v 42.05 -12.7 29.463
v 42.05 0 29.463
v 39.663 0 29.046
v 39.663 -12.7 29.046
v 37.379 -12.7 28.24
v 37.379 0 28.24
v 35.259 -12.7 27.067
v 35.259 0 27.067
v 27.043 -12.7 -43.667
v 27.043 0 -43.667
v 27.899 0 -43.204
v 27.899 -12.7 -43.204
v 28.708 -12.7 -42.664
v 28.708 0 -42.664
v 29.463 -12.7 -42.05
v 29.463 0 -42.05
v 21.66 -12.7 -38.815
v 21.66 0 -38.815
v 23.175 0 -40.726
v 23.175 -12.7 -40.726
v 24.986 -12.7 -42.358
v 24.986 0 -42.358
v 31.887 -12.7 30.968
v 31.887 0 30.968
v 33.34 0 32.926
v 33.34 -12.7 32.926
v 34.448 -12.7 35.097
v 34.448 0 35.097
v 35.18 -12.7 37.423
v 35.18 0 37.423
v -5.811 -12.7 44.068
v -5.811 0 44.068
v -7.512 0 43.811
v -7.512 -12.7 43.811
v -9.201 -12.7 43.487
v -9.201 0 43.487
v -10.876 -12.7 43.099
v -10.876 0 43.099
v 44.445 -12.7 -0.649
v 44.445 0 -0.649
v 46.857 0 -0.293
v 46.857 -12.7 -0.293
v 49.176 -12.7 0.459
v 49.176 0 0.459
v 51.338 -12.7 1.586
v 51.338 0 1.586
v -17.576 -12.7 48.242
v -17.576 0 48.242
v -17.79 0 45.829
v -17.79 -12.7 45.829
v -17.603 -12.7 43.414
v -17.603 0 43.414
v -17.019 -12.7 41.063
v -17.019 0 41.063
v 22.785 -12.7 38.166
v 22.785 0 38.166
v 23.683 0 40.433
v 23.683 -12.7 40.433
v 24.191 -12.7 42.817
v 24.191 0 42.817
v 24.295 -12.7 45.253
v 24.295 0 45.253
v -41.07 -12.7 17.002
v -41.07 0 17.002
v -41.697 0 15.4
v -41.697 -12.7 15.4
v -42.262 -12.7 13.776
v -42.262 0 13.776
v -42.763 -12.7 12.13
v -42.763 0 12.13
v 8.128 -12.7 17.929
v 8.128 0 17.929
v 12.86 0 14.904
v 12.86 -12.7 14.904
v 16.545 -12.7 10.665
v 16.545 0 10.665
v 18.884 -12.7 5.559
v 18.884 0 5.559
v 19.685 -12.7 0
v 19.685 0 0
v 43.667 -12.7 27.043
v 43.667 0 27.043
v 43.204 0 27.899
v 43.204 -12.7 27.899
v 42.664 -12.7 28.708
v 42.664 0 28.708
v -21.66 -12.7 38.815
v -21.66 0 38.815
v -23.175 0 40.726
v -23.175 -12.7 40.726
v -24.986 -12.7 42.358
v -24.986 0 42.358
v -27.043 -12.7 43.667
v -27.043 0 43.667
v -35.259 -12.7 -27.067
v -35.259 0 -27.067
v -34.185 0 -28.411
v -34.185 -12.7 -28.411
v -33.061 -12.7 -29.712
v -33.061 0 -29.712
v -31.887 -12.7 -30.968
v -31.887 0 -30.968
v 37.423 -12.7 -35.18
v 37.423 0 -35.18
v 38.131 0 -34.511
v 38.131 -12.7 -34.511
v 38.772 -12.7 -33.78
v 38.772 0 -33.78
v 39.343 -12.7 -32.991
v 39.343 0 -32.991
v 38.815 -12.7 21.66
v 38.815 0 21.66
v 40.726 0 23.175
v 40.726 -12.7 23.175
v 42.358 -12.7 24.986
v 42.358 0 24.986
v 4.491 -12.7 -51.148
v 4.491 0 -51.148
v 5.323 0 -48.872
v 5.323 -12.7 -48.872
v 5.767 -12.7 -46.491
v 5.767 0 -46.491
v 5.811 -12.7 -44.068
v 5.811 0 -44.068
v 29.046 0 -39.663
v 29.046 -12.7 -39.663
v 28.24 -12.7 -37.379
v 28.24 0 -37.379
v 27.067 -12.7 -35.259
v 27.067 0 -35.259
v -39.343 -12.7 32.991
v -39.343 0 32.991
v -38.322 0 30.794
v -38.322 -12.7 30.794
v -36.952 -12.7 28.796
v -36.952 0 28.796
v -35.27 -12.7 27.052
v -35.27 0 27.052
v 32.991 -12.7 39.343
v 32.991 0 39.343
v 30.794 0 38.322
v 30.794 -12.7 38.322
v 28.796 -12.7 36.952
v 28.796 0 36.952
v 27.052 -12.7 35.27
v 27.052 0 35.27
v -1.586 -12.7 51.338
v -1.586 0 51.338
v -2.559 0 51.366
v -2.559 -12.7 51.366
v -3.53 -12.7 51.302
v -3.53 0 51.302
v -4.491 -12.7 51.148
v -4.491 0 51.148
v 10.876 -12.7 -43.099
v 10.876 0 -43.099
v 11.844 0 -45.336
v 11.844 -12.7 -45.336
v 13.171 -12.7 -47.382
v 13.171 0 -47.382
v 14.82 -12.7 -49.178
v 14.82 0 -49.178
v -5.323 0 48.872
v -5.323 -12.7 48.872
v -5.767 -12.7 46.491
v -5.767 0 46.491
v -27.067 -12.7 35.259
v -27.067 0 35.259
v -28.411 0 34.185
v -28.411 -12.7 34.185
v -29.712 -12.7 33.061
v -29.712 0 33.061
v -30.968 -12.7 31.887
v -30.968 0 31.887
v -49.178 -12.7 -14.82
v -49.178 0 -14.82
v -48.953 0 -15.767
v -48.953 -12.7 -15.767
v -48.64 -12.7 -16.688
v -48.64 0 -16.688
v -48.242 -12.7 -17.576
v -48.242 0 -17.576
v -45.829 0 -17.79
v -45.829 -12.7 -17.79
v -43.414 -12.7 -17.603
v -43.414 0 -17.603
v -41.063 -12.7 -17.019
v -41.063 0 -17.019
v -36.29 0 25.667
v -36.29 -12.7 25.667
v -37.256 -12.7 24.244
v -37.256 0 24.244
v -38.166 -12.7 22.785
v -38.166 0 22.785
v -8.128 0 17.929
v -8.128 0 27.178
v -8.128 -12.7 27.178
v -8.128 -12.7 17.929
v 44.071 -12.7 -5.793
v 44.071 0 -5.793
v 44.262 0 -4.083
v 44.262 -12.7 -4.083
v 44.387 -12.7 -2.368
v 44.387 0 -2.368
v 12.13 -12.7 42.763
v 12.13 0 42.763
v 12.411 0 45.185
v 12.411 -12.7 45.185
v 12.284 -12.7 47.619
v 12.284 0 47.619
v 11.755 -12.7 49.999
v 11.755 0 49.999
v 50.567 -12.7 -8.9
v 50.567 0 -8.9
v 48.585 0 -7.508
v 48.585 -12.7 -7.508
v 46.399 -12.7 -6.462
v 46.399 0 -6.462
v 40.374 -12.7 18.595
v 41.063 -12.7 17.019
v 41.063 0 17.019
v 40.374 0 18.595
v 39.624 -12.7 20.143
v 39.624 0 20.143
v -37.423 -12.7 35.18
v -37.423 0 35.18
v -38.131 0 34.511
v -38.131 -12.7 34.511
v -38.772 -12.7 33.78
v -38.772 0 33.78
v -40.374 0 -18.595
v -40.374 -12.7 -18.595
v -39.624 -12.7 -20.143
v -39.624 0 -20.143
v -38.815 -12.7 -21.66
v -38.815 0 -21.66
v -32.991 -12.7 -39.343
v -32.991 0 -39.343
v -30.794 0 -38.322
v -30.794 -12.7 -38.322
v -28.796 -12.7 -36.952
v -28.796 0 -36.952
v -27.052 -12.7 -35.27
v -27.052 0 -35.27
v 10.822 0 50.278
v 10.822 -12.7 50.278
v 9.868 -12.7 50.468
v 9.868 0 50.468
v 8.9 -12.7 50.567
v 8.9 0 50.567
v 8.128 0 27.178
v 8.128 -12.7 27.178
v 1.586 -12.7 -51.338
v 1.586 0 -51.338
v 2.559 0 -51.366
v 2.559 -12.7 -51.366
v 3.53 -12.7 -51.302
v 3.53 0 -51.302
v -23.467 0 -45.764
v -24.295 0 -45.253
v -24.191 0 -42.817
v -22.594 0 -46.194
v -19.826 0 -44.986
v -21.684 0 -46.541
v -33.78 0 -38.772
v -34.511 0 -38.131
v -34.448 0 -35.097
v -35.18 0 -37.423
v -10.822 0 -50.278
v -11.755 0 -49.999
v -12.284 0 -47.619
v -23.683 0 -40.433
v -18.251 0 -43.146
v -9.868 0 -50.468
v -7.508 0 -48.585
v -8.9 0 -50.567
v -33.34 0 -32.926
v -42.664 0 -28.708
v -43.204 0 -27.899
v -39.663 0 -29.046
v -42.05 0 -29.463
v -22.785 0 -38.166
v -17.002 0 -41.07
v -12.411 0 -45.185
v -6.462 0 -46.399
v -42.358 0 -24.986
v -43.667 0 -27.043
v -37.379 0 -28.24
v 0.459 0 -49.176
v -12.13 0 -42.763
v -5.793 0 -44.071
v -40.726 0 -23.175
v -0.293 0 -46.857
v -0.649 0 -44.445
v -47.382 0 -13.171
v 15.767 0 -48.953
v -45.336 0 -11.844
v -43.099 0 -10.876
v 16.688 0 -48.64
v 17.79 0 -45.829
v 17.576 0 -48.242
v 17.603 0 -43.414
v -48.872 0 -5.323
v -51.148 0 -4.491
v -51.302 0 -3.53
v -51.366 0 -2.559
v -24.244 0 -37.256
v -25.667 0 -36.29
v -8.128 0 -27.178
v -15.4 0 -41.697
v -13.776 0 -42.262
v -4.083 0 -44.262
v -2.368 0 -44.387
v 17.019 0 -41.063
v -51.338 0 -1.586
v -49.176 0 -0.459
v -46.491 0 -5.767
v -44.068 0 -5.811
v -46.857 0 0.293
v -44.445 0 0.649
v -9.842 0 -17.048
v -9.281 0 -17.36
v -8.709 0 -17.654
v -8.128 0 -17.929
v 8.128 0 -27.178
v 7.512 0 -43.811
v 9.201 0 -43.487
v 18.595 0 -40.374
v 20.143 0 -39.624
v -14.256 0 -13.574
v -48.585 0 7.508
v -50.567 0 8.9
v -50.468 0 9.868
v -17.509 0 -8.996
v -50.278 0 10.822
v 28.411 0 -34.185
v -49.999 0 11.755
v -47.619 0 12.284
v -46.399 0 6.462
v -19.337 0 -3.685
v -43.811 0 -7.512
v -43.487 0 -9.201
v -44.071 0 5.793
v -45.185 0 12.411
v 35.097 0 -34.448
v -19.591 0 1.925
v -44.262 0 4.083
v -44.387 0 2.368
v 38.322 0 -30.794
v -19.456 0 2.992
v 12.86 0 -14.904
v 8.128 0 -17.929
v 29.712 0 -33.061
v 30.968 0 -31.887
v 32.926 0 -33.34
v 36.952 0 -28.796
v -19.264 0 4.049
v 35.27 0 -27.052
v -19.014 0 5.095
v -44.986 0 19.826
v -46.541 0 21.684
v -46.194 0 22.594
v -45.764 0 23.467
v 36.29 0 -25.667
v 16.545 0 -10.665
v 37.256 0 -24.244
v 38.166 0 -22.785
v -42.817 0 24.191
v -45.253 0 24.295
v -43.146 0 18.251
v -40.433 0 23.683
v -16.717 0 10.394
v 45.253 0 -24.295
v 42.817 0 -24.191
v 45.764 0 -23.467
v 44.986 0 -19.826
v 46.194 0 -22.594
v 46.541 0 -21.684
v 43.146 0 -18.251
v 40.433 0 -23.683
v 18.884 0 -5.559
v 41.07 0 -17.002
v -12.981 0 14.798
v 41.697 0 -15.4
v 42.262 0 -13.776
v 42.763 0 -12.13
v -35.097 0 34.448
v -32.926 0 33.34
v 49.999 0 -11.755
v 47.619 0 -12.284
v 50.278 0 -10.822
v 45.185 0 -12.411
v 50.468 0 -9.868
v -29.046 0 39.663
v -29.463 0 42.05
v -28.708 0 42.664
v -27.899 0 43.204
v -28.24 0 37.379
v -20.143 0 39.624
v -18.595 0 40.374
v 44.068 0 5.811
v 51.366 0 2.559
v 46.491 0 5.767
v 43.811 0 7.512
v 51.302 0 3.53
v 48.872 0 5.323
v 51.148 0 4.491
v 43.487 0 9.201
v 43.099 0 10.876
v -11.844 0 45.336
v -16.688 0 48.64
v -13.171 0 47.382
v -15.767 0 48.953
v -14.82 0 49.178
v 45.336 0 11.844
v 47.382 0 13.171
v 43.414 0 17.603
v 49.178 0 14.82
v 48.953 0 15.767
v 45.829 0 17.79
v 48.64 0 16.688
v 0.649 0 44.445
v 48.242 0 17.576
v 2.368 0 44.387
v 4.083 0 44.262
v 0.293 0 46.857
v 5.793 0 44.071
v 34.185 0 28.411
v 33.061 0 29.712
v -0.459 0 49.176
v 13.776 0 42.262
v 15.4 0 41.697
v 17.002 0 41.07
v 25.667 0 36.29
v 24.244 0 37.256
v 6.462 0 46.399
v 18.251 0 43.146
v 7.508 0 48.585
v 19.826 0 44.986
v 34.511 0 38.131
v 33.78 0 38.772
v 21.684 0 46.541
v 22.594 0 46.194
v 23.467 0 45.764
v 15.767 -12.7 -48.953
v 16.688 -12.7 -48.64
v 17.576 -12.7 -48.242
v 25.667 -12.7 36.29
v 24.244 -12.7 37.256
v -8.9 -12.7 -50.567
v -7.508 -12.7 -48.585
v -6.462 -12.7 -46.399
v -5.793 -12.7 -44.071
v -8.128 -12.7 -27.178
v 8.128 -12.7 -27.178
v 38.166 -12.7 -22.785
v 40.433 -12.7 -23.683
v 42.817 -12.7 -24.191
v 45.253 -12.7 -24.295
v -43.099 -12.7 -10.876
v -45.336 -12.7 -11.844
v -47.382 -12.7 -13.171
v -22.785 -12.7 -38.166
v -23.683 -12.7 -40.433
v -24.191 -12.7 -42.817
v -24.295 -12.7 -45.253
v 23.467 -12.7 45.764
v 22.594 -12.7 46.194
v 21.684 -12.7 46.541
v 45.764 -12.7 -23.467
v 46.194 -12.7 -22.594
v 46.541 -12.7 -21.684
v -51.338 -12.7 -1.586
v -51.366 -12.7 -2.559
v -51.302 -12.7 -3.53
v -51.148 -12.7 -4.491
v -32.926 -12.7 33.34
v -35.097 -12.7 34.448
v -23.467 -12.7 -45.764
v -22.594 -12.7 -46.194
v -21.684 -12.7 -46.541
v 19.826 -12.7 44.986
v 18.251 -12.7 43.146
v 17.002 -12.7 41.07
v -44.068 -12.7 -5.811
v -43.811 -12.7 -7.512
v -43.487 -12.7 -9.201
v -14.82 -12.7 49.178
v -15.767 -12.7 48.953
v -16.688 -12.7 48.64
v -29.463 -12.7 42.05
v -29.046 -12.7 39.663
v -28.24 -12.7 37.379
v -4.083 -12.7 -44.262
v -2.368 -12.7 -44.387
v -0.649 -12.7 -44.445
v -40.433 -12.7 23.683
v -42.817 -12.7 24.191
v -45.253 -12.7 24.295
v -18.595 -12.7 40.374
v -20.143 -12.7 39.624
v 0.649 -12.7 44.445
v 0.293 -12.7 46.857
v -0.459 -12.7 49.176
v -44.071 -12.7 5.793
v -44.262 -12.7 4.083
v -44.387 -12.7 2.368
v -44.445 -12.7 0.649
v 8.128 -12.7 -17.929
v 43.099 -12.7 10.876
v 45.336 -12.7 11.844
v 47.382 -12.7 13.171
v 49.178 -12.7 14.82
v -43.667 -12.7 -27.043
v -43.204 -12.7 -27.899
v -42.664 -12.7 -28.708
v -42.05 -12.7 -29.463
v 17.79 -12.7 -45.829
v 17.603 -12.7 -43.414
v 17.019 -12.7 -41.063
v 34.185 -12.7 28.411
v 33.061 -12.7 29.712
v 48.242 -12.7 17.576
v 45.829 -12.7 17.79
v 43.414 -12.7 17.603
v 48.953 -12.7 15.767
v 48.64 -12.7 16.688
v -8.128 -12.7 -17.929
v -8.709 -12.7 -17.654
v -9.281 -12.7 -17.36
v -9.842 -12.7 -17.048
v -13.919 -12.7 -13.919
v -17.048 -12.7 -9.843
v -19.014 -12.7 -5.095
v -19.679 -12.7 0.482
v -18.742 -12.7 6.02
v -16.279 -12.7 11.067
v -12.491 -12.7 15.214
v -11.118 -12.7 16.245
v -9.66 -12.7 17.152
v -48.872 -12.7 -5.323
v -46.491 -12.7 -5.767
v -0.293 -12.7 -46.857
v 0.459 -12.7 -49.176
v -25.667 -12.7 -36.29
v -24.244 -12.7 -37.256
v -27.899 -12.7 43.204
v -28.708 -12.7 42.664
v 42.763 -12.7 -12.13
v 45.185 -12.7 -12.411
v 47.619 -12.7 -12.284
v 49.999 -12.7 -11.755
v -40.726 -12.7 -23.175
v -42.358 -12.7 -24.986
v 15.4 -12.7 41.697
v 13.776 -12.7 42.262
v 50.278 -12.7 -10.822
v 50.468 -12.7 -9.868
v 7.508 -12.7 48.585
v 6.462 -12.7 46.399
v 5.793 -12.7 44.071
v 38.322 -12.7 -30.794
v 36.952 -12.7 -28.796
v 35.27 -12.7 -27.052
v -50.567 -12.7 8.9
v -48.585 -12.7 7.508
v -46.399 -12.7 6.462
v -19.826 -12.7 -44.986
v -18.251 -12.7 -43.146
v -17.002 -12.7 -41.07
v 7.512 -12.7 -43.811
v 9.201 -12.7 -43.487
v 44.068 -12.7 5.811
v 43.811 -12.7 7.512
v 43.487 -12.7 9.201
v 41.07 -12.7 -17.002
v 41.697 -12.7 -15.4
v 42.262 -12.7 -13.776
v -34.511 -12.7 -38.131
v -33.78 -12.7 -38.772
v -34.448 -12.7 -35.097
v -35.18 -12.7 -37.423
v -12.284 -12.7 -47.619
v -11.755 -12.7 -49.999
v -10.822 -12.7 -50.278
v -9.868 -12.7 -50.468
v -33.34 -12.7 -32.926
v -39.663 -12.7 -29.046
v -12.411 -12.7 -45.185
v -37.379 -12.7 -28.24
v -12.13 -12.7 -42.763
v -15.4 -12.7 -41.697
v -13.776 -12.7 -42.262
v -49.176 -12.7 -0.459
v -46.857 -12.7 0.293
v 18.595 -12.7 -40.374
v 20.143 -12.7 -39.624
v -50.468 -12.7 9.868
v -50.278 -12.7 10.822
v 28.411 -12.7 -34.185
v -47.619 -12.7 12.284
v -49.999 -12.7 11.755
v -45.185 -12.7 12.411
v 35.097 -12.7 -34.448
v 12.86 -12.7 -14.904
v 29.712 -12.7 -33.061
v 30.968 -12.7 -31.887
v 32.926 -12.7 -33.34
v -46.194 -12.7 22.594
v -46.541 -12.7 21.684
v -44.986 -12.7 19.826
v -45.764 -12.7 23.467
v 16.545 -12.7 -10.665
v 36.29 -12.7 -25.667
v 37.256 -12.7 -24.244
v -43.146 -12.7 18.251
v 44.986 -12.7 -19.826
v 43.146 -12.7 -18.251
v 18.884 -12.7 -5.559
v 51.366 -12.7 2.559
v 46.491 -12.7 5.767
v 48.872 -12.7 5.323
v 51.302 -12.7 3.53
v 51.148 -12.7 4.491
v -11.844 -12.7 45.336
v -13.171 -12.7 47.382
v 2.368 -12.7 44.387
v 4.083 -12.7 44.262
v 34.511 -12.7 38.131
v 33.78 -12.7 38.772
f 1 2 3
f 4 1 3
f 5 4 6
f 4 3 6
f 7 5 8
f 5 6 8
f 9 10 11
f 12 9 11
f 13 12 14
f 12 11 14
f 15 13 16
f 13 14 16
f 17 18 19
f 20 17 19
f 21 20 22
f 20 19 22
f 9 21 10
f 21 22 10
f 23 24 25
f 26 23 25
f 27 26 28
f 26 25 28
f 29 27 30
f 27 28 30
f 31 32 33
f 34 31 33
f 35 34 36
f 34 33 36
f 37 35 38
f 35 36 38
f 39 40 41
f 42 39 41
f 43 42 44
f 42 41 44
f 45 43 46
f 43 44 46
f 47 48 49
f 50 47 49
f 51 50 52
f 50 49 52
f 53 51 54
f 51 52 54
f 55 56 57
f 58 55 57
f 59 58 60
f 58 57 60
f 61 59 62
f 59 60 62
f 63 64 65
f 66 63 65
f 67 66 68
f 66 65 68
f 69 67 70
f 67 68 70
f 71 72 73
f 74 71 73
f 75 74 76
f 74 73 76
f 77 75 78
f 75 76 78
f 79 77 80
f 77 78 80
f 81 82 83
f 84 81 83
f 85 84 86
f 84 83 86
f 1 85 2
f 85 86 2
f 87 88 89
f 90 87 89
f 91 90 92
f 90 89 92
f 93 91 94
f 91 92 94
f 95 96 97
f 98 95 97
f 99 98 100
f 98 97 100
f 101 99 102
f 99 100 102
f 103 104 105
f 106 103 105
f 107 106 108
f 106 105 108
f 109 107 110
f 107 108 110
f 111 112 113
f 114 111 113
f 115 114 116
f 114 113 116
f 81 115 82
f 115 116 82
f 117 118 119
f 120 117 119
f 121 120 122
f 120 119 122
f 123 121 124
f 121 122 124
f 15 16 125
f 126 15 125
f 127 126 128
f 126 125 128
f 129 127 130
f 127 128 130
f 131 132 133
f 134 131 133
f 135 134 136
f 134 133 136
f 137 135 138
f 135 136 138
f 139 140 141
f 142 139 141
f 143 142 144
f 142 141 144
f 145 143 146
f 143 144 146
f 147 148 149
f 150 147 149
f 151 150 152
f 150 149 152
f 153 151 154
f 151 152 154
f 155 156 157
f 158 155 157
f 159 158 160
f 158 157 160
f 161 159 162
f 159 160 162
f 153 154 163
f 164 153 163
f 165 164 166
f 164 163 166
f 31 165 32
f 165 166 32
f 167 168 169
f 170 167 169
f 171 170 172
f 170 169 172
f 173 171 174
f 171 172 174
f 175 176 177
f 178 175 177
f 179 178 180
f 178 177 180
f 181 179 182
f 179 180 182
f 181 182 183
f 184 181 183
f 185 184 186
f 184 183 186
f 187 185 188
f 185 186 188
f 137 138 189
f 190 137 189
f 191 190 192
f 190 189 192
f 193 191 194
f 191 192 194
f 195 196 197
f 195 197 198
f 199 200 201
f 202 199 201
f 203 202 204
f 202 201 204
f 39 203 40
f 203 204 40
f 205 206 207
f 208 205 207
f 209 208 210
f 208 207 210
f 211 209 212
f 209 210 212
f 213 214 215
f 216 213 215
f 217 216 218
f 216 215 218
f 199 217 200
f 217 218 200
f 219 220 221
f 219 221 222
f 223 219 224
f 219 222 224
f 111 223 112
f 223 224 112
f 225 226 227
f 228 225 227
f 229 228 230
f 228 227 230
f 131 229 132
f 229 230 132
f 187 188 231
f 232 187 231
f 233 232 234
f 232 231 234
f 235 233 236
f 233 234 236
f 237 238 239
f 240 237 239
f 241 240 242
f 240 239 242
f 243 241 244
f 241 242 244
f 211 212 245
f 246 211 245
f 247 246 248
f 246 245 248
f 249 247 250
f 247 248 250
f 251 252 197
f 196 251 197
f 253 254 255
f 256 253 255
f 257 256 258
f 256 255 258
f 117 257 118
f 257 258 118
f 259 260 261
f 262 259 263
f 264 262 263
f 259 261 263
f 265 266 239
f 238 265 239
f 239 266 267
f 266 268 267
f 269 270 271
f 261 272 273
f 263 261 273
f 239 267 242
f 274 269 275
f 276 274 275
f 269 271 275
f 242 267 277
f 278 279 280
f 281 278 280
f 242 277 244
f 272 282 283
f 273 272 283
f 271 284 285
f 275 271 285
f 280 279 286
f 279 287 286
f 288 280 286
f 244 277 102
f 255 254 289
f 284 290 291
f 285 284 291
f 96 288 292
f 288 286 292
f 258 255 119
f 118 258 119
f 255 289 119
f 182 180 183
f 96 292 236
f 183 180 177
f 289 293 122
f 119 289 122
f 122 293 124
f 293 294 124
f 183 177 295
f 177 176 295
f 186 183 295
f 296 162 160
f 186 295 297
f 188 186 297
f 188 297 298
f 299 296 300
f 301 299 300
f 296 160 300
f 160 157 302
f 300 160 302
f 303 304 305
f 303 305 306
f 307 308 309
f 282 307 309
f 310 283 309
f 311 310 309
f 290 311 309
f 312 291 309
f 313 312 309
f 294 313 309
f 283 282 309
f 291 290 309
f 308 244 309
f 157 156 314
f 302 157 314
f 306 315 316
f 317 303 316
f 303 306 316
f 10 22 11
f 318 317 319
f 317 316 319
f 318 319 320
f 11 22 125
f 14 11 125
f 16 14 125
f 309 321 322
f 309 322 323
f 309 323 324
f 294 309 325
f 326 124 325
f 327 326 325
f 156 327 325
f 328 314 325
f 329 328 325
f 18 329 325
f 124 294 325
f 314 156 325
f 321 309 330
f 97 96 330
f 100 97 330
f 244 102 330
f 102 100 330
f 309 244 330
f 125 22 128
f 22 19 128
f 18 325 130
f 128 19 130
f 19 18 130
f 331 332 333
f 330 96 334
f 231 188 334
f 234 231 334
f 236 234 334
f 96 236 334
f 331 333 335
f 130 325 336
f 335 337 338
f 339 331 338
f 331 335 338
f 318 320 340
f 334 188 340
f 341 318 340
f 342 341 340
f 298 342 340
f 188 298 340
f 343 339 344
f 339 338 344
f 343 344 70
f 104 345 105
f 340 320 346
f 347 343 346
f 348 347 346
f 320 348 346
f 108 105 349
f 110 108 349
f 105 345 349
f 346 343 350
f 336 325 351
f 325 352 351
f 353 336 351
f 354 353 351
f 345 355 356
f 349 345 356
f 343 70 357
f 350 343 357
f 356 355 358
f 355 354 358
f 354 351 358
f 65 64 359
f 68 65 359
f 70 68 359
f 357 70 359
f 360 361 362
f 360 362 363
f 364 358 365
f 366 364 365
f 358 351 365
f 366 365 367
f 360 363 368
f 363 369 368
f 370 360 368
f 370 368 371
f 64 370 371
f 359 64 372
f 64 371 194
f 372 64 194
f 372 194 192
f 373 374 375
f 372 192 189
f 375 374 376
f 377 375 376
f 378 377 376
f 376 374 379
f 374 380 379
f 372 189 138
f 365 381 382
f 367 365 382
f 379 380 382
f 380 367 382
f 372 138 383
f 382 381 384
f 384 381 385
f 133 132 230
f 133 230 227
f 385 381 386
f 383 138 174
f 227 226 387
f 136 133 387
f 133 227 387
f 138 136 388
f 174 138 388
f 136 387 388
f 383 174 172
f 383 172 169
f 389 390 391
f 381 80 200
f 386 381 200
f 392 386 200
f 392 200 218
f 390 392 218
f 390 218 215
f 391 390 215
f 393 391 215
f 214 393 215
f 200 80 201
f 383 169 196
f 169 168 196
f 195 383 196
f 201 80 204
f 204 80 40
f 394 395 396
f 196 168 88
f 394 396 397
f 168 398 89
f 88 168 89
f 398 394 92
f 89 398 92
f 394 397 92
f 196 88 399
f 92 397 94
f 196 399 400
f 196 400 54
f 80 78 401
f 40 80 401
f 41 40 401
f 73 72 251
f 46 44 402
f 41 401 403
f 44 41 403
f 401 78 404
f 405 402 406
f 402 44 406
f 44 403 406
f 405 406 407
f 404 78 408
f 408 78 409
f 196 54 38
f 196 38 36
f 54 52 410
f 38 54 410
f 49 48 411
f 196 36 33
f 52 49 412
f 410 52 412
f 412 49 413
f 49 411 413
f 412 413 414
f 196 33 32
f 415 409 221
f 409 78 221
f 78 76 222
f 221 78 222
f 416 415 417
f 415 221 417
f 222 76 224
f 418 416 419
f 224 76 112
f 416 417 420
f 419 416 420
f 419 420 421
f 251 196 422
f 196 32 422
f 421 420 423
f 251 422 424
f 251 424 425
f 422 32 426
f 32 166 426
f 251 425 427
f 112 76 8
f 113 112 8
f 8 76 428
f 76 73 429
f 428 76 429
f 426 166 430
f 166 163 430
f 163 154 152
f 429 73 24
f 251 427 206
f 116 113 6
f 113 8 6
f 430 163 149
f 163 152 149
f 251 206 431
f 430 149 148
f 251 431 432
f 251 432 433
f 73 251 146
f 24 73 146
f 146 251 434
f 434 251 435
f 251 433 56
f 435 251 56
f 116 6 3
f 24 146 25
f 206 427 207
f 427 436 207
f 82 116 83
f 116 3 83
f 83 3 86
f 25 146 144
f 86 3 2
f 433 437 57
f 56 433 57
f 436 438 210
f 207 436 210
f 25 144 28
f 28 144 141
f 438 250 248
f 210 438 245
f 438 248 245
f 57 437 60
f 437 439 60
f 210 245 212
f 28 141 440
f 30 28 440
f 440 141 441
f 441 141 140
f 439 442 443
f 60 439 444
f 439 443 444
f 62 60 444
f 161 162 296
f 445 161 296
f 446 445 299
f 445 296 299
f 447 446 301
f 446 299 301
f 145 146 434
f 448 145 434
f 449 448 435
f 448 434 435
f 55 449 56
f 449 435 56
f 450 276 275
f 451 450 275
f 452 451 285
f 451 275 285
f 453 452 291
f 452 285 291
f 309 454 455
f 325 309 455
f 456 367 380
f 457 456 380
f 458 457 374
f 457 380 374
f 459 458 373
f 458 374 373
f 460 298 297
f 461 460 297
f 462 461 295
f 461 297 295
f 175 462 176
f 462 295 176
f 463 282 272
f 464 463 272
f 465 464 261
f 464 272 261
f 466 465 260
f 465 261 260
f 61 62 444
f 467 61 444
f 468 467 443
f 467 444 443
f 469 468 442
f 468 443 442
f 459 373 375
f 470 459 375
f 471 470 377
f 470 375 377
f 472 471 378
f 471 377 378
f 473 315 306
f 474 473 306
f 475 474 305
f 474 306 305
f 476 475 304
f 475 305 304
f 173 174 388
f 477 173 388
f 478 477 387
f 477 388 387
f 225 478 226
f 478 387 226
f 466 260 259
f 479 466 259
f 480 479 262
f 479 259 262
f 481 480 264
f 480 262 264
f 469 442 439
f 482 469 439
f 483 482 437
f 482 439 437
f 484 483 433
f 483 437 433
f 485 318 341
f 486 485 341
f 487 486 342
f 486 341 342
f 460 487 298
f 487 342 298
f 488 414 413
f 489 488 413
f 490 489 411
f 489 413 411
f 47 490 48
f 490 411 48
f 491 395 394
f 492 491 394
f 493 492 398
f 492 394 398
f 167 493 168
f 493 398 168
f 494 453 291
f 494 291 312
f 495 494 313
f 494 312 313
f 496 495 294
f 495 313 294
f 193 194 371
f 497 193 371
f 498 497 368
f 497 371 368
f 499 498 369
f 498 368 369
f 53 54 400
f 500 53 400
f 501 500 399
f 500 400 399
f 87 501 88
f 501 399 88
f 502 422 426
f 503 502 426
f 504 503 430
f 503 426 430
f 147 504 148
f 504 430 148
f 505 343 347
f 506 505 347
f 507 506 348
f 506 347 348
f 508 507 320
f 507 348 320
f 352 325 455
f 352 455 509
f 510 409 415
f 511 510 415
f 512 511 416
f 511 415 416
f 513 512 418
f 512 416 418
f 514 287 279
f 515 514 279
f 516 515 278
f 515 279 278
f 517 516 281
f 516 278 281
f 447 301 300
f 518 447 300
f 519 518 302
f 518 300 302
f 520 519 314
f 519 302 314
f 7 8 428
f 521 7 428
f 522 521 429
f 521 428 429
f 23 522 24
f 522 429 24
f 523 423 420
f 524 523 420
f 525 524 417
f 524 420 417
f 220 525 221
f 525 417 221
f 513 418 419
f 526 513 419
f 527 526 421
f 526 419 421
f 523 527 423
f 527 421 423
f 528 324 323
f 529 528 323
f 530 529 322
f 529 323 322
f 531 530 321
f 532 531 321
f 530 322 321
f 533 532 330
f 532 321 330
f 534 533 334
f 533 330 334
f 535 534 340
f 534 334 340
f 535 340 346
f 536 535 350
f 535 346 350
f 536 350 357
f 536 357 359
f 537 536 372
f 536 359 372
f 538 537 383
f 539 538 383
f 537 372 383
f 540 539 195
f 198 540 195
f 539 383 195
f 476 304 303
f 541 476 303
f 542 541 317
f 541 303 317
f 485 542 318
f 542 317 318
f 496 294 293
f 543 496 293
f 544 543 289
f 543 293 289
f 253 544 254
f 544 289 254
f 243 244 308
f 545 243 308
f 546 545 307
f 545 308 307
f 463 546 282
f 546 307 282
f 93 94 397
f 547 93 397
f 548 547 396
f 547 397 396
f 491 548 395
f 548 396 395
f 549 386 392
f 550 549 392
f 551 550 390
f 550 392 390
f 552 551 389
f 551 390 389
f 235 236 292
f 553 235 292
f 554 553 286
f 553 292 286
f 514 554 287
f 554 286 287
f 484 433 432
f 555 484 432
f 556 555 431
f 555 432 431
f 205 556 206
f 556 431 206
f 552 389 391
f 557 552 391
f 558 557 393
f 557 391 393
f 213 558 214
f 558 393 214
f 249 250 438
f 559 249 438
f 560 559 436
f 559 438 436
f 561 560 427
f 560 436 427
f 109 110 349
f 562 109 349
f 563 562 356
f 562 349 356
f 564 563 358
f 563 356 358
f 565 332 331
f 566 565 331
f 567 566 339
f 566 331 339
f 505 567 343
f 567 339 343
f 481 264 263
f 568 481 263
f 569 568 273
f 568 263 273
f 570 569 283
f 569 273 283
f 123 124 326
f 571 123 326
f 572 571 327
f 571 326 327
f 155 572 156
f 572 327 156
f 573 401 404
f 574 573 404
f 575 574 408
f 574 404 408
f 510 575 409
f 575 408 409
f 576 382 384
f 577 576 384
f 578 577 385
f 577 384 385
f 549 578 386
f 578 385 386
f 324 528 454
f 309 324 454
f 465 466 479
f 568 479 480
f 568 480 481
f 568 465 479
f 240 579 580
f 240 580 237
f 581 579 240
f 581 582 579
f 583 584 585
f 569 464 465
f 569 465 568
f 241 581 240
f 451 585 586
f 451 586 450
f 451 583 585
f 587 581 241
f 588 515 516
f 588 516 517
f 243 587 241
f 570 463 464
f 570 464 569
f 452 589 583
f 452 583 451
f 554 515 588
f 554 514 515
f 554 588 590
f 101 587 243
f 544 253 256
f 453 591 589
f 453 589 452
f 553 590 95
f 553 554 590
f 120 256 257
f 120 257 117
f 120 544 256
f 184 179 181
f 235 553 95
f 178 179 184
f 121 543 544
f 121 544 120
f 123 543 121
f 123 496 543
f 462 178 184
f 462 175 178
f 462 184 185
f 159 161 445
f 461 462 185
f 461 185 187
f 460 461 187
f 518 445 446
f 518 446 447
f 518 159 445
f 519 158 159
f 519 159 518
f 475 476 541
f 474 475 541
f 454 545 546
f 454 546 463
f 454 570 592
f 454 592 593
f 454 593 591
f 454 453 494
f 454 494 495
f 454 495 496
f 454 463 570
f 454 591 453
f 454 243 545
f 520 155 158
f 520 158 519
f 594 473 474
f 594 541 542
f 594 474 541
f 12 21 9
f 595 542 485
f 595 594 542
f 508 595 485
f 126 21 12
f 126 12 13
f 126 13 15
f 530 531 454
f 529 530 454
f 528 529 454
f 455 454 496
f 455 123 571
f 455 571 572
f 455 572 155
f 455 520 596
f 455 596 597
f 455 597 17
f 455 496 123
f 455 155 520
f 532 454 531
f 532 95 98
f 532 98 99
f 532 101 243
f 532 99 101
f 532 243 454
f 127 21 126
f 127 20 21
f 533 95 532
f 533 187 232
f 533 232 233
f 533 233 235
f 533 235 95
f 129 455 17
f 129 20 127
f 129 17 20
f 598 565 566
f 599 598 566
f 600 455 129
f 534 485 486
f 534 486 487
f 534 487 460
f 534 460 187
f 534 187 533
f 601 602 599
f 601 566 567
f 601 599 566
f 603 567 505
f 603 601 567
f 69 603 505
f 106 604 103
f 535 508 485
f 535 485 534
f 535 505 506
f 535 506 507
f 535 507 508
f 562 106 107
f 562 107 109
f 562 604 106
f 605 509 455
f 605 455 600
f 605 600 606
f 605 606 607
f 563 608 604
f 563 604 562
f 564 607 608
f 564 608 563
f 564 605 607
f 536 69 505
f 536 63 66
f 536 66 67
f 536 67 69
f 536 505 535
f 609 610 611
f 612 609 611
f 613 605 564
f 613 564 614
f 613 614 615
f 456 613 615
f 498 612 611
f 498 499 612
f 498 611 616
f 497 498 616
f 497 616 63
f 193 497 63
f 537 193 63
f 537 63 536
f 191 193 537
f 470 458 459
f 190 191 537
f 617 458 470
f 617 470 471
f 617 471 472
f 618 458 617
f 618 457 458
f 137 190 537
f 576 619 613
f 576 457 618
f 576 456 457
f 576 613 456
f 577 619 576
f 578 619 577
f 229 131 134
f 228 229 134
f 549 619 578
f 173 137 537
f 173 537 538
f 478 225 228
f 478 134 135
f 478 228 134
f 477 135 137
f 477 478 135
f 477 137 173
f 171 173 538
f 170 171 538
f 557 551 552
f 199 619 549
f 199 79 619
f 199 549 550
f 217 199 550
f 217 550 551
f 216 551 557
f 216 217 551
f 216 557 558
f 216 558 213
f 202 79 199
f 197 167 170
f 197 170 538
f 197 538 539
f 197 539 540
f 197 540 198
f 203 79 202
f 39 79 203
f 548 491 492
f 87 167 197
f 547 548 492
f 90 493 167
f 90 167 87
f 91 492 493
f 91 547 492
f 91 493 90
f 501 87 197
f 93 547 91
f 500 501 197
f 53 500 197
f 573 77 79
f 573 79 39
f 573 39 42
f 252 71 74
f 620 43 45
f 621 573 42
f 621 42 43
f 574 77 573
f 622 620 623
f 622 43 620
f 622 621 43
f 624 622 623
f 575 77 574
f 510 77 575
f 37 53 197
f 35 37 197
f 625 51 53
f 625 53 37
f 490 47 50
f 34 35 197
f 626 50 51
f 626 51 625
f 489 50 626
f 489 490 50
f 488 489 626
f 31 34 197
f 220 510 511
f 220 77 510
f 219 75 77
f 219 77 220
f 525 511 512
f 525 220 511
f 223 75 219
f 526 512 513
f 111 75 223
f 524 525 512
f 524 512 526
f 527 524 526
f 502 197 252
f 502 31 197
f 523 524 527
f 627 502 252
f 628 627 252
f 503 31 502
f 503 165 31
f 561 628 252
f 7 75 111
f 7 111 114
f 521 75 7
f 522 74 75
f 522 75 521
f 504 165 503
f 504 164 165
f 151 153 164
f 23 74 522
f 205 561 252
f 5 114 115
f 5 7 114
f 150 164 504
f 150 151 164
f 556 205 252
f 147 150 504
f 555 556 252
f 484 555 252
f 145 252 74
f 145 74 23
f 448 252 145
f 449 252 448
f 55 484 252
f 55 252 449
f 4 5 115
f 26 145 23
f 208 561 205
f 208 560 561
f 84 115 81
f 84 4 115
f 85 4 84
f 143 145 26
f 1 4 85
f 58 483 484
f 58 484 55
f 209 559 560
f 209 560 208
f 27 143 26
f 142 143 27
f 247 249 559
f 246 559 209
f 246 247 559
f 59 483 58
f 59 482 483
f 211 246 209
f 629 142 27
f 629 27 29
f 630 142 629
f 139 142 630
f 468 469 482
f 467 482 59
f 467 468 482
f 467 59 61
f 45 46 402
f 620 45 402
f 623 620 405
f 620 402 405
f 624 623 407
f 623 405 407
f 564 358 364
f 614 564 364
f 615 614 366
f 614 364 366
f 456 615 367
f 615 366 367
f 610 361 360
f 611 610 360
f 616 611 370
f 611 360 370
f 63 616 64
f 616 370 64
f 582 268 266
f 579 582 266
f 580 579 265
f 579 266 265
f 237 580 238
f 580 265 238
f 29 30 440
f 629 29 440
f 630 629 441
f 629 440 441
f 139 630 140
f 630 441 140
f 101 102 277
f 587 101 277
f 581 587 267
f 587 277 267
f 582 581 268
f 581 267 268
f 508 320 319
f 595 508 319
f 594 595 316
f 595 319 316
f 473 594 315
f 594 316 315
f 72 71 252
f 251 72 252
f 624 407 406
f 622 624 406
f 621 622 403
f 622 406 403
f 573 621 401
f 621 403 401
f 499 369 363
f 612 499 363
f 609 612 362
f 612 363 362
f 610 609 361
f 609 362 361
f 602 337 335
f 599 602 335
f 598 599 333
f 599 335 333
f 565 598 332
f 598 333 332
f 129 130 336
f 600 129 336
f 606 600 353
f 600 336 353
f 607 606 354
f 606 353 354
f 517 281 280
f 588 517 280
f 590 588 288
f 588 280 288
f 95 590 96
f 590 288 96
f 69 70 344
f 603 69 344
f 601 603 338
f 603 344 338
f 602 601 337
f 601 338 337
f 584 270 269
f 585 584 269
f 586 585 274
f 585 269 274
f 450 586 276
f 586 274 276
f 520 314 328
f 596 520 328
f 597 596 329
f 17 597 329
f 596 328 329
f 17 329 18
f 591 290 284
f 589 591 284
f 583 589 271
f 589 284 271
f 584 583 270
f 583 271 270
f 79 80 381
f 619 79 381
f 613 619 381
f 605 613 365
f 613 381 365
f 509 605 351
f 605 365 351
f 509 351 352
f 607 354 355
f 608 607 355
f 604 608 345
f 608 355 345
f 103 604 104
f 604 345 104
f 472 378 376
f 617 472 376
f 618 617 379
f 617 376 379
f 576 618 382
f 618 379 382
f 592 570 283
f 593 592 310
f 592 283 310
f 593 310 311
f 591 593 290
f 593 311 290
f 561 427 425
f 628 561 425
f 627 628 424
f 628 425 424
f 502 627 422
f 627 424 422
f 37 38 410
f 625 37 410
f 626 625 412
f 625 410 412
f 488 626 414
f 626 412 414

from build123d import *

# Parameters (mm, degrees)
F1_DEPTH = 12.7
F2_COUNT = 24
F2_ANGLE = 345
F3_DEPTH = 25.4


# Not quite as in the source:
# - a feature names something its author has since deleted; it is built from what else it names


with BuildPart() as f1:
    # F0 (on Front) → F1 (new body)
    with BuildSketch(Plane.XZ):
        with BuildLine():
            ThreePointArc((-5.81118052, 44.0684998719), (-29.3043983549, -33.4223688128), (44.45, 0))
            ThreePointArc((44.45, 0), (31.6596085179, 31.2005078243), (0.6492491116, 44.4452581902))
            ThreePointArc((0.6492491116, 44.4452581902), (-2.5878312685, 44.3746056808), (-5.81118052, 44.0684998719))
        make_face()
        with BuildLine():
            ThreePointArc((8.128, 17.9286039892), (16.5453755624, 10.6653538385), (19.685, 0))
            ThreePointArc((19.685, 0), (16.5453755624, -10.6653538385), (8.128, -17.9286039892))
            Line((8.128, -17.9286039892), (8.128, -27.178))
            Line((8.128, -27.178), (-8.128, -27.178))
            Line((-8.128, -27.178), (-8.128, -17.9286039892))
            ThreePointArc((-8.128, -17.9286039892), (-19.685, 0), (-8.128, 17.9286039892))
            Line((-8.128, 17.9286039892), (-8.128, 27.178))
            Line((-8.128, 27.178), (8.128, 27.178))
            Line((8.128, 27.178), (8.128, 17.9286039892))
        make_face(mode=Mode.SUBTRACT)
        with BuildLine():
            ThreePointArc((-5.81118052, 44.0684998719), (-2.5878312685, 44.3746056808), (0.6492491116, 44.4452581902))
            ThreePointArc((0.6492491116, 44.4452581902), (-0.0343594341, 48.0324601777), (-1.5864878253, 51.3379459514))
            ThreePointArc((-1.5864878253, 51.3379459514), (-3.0455527066, 51.3454237754), (-4.4911590337, 51.147563742))
            ThreePointArc((-4.4911590337, 51.147563742), (-5.5943052126, 47.6906625485), (-5.81118052, 44.0684998719))
        make_face()
    extrude(amount=F1_DEPTH)

    # F2: F1 ×24 about axis
    f2_axis = Axis((0, 0, 0), (0, 1, 0))


with BuildPart() as f1_1:
    add(f1.part)
    for i in range(1, F2_COUNT):
        add(f1.part.rotate(f2_axis, i * F2_ANGLE / (F2_COUNT - 1)))


with BuildPart() as f3:
    # F0 (on Front) → F3 (new body, symmetric)
    with BuildSketch(Plane.XZ):
        with BuildLine():
            ThreePointArc((-8.128, 17.9286039892), (0, 19.685), (8.128, 17.9286039892))
            Line((8.128, 17.9286039892), (8.128, 27.178))
            Line((8.128, 27.178), (-8.128, 27.178))
            Line((-8.128, 27.178), (-8.128, 17.9286039892))
        make_face()
    extrude(amount=F3_DEPTH, both=True)


with BuildPart() as f3b:
    # F0 (on Front) → F3, piece 2 (new body, symmetric)
    with BuildSketch(Plane.XZ):
        with BuildLine():
            Line((8.128, -27.178), (8.128, -17.9286039892))
            ThreePointArc((8.128, -17.9286039892), (0, -19.685), (-8.128, -17.9286039892))
            Line((-8.128, -17.9286039892), (-8.128, -27.178))
            Line((-8.128, -27.178), (8.128, -27.178))
        make_face()
    extrude(amount=F3_DEPTH, both=True)


with BuildPart() as f1_2:
    add(f1_1.part)

    # F4: cut F3, F3b
    add(f3.part, mode=Mode.SUBTRACT)
    add(f3b.part, mode=Mode.SUBTRACT)


solid = f1_2.part
